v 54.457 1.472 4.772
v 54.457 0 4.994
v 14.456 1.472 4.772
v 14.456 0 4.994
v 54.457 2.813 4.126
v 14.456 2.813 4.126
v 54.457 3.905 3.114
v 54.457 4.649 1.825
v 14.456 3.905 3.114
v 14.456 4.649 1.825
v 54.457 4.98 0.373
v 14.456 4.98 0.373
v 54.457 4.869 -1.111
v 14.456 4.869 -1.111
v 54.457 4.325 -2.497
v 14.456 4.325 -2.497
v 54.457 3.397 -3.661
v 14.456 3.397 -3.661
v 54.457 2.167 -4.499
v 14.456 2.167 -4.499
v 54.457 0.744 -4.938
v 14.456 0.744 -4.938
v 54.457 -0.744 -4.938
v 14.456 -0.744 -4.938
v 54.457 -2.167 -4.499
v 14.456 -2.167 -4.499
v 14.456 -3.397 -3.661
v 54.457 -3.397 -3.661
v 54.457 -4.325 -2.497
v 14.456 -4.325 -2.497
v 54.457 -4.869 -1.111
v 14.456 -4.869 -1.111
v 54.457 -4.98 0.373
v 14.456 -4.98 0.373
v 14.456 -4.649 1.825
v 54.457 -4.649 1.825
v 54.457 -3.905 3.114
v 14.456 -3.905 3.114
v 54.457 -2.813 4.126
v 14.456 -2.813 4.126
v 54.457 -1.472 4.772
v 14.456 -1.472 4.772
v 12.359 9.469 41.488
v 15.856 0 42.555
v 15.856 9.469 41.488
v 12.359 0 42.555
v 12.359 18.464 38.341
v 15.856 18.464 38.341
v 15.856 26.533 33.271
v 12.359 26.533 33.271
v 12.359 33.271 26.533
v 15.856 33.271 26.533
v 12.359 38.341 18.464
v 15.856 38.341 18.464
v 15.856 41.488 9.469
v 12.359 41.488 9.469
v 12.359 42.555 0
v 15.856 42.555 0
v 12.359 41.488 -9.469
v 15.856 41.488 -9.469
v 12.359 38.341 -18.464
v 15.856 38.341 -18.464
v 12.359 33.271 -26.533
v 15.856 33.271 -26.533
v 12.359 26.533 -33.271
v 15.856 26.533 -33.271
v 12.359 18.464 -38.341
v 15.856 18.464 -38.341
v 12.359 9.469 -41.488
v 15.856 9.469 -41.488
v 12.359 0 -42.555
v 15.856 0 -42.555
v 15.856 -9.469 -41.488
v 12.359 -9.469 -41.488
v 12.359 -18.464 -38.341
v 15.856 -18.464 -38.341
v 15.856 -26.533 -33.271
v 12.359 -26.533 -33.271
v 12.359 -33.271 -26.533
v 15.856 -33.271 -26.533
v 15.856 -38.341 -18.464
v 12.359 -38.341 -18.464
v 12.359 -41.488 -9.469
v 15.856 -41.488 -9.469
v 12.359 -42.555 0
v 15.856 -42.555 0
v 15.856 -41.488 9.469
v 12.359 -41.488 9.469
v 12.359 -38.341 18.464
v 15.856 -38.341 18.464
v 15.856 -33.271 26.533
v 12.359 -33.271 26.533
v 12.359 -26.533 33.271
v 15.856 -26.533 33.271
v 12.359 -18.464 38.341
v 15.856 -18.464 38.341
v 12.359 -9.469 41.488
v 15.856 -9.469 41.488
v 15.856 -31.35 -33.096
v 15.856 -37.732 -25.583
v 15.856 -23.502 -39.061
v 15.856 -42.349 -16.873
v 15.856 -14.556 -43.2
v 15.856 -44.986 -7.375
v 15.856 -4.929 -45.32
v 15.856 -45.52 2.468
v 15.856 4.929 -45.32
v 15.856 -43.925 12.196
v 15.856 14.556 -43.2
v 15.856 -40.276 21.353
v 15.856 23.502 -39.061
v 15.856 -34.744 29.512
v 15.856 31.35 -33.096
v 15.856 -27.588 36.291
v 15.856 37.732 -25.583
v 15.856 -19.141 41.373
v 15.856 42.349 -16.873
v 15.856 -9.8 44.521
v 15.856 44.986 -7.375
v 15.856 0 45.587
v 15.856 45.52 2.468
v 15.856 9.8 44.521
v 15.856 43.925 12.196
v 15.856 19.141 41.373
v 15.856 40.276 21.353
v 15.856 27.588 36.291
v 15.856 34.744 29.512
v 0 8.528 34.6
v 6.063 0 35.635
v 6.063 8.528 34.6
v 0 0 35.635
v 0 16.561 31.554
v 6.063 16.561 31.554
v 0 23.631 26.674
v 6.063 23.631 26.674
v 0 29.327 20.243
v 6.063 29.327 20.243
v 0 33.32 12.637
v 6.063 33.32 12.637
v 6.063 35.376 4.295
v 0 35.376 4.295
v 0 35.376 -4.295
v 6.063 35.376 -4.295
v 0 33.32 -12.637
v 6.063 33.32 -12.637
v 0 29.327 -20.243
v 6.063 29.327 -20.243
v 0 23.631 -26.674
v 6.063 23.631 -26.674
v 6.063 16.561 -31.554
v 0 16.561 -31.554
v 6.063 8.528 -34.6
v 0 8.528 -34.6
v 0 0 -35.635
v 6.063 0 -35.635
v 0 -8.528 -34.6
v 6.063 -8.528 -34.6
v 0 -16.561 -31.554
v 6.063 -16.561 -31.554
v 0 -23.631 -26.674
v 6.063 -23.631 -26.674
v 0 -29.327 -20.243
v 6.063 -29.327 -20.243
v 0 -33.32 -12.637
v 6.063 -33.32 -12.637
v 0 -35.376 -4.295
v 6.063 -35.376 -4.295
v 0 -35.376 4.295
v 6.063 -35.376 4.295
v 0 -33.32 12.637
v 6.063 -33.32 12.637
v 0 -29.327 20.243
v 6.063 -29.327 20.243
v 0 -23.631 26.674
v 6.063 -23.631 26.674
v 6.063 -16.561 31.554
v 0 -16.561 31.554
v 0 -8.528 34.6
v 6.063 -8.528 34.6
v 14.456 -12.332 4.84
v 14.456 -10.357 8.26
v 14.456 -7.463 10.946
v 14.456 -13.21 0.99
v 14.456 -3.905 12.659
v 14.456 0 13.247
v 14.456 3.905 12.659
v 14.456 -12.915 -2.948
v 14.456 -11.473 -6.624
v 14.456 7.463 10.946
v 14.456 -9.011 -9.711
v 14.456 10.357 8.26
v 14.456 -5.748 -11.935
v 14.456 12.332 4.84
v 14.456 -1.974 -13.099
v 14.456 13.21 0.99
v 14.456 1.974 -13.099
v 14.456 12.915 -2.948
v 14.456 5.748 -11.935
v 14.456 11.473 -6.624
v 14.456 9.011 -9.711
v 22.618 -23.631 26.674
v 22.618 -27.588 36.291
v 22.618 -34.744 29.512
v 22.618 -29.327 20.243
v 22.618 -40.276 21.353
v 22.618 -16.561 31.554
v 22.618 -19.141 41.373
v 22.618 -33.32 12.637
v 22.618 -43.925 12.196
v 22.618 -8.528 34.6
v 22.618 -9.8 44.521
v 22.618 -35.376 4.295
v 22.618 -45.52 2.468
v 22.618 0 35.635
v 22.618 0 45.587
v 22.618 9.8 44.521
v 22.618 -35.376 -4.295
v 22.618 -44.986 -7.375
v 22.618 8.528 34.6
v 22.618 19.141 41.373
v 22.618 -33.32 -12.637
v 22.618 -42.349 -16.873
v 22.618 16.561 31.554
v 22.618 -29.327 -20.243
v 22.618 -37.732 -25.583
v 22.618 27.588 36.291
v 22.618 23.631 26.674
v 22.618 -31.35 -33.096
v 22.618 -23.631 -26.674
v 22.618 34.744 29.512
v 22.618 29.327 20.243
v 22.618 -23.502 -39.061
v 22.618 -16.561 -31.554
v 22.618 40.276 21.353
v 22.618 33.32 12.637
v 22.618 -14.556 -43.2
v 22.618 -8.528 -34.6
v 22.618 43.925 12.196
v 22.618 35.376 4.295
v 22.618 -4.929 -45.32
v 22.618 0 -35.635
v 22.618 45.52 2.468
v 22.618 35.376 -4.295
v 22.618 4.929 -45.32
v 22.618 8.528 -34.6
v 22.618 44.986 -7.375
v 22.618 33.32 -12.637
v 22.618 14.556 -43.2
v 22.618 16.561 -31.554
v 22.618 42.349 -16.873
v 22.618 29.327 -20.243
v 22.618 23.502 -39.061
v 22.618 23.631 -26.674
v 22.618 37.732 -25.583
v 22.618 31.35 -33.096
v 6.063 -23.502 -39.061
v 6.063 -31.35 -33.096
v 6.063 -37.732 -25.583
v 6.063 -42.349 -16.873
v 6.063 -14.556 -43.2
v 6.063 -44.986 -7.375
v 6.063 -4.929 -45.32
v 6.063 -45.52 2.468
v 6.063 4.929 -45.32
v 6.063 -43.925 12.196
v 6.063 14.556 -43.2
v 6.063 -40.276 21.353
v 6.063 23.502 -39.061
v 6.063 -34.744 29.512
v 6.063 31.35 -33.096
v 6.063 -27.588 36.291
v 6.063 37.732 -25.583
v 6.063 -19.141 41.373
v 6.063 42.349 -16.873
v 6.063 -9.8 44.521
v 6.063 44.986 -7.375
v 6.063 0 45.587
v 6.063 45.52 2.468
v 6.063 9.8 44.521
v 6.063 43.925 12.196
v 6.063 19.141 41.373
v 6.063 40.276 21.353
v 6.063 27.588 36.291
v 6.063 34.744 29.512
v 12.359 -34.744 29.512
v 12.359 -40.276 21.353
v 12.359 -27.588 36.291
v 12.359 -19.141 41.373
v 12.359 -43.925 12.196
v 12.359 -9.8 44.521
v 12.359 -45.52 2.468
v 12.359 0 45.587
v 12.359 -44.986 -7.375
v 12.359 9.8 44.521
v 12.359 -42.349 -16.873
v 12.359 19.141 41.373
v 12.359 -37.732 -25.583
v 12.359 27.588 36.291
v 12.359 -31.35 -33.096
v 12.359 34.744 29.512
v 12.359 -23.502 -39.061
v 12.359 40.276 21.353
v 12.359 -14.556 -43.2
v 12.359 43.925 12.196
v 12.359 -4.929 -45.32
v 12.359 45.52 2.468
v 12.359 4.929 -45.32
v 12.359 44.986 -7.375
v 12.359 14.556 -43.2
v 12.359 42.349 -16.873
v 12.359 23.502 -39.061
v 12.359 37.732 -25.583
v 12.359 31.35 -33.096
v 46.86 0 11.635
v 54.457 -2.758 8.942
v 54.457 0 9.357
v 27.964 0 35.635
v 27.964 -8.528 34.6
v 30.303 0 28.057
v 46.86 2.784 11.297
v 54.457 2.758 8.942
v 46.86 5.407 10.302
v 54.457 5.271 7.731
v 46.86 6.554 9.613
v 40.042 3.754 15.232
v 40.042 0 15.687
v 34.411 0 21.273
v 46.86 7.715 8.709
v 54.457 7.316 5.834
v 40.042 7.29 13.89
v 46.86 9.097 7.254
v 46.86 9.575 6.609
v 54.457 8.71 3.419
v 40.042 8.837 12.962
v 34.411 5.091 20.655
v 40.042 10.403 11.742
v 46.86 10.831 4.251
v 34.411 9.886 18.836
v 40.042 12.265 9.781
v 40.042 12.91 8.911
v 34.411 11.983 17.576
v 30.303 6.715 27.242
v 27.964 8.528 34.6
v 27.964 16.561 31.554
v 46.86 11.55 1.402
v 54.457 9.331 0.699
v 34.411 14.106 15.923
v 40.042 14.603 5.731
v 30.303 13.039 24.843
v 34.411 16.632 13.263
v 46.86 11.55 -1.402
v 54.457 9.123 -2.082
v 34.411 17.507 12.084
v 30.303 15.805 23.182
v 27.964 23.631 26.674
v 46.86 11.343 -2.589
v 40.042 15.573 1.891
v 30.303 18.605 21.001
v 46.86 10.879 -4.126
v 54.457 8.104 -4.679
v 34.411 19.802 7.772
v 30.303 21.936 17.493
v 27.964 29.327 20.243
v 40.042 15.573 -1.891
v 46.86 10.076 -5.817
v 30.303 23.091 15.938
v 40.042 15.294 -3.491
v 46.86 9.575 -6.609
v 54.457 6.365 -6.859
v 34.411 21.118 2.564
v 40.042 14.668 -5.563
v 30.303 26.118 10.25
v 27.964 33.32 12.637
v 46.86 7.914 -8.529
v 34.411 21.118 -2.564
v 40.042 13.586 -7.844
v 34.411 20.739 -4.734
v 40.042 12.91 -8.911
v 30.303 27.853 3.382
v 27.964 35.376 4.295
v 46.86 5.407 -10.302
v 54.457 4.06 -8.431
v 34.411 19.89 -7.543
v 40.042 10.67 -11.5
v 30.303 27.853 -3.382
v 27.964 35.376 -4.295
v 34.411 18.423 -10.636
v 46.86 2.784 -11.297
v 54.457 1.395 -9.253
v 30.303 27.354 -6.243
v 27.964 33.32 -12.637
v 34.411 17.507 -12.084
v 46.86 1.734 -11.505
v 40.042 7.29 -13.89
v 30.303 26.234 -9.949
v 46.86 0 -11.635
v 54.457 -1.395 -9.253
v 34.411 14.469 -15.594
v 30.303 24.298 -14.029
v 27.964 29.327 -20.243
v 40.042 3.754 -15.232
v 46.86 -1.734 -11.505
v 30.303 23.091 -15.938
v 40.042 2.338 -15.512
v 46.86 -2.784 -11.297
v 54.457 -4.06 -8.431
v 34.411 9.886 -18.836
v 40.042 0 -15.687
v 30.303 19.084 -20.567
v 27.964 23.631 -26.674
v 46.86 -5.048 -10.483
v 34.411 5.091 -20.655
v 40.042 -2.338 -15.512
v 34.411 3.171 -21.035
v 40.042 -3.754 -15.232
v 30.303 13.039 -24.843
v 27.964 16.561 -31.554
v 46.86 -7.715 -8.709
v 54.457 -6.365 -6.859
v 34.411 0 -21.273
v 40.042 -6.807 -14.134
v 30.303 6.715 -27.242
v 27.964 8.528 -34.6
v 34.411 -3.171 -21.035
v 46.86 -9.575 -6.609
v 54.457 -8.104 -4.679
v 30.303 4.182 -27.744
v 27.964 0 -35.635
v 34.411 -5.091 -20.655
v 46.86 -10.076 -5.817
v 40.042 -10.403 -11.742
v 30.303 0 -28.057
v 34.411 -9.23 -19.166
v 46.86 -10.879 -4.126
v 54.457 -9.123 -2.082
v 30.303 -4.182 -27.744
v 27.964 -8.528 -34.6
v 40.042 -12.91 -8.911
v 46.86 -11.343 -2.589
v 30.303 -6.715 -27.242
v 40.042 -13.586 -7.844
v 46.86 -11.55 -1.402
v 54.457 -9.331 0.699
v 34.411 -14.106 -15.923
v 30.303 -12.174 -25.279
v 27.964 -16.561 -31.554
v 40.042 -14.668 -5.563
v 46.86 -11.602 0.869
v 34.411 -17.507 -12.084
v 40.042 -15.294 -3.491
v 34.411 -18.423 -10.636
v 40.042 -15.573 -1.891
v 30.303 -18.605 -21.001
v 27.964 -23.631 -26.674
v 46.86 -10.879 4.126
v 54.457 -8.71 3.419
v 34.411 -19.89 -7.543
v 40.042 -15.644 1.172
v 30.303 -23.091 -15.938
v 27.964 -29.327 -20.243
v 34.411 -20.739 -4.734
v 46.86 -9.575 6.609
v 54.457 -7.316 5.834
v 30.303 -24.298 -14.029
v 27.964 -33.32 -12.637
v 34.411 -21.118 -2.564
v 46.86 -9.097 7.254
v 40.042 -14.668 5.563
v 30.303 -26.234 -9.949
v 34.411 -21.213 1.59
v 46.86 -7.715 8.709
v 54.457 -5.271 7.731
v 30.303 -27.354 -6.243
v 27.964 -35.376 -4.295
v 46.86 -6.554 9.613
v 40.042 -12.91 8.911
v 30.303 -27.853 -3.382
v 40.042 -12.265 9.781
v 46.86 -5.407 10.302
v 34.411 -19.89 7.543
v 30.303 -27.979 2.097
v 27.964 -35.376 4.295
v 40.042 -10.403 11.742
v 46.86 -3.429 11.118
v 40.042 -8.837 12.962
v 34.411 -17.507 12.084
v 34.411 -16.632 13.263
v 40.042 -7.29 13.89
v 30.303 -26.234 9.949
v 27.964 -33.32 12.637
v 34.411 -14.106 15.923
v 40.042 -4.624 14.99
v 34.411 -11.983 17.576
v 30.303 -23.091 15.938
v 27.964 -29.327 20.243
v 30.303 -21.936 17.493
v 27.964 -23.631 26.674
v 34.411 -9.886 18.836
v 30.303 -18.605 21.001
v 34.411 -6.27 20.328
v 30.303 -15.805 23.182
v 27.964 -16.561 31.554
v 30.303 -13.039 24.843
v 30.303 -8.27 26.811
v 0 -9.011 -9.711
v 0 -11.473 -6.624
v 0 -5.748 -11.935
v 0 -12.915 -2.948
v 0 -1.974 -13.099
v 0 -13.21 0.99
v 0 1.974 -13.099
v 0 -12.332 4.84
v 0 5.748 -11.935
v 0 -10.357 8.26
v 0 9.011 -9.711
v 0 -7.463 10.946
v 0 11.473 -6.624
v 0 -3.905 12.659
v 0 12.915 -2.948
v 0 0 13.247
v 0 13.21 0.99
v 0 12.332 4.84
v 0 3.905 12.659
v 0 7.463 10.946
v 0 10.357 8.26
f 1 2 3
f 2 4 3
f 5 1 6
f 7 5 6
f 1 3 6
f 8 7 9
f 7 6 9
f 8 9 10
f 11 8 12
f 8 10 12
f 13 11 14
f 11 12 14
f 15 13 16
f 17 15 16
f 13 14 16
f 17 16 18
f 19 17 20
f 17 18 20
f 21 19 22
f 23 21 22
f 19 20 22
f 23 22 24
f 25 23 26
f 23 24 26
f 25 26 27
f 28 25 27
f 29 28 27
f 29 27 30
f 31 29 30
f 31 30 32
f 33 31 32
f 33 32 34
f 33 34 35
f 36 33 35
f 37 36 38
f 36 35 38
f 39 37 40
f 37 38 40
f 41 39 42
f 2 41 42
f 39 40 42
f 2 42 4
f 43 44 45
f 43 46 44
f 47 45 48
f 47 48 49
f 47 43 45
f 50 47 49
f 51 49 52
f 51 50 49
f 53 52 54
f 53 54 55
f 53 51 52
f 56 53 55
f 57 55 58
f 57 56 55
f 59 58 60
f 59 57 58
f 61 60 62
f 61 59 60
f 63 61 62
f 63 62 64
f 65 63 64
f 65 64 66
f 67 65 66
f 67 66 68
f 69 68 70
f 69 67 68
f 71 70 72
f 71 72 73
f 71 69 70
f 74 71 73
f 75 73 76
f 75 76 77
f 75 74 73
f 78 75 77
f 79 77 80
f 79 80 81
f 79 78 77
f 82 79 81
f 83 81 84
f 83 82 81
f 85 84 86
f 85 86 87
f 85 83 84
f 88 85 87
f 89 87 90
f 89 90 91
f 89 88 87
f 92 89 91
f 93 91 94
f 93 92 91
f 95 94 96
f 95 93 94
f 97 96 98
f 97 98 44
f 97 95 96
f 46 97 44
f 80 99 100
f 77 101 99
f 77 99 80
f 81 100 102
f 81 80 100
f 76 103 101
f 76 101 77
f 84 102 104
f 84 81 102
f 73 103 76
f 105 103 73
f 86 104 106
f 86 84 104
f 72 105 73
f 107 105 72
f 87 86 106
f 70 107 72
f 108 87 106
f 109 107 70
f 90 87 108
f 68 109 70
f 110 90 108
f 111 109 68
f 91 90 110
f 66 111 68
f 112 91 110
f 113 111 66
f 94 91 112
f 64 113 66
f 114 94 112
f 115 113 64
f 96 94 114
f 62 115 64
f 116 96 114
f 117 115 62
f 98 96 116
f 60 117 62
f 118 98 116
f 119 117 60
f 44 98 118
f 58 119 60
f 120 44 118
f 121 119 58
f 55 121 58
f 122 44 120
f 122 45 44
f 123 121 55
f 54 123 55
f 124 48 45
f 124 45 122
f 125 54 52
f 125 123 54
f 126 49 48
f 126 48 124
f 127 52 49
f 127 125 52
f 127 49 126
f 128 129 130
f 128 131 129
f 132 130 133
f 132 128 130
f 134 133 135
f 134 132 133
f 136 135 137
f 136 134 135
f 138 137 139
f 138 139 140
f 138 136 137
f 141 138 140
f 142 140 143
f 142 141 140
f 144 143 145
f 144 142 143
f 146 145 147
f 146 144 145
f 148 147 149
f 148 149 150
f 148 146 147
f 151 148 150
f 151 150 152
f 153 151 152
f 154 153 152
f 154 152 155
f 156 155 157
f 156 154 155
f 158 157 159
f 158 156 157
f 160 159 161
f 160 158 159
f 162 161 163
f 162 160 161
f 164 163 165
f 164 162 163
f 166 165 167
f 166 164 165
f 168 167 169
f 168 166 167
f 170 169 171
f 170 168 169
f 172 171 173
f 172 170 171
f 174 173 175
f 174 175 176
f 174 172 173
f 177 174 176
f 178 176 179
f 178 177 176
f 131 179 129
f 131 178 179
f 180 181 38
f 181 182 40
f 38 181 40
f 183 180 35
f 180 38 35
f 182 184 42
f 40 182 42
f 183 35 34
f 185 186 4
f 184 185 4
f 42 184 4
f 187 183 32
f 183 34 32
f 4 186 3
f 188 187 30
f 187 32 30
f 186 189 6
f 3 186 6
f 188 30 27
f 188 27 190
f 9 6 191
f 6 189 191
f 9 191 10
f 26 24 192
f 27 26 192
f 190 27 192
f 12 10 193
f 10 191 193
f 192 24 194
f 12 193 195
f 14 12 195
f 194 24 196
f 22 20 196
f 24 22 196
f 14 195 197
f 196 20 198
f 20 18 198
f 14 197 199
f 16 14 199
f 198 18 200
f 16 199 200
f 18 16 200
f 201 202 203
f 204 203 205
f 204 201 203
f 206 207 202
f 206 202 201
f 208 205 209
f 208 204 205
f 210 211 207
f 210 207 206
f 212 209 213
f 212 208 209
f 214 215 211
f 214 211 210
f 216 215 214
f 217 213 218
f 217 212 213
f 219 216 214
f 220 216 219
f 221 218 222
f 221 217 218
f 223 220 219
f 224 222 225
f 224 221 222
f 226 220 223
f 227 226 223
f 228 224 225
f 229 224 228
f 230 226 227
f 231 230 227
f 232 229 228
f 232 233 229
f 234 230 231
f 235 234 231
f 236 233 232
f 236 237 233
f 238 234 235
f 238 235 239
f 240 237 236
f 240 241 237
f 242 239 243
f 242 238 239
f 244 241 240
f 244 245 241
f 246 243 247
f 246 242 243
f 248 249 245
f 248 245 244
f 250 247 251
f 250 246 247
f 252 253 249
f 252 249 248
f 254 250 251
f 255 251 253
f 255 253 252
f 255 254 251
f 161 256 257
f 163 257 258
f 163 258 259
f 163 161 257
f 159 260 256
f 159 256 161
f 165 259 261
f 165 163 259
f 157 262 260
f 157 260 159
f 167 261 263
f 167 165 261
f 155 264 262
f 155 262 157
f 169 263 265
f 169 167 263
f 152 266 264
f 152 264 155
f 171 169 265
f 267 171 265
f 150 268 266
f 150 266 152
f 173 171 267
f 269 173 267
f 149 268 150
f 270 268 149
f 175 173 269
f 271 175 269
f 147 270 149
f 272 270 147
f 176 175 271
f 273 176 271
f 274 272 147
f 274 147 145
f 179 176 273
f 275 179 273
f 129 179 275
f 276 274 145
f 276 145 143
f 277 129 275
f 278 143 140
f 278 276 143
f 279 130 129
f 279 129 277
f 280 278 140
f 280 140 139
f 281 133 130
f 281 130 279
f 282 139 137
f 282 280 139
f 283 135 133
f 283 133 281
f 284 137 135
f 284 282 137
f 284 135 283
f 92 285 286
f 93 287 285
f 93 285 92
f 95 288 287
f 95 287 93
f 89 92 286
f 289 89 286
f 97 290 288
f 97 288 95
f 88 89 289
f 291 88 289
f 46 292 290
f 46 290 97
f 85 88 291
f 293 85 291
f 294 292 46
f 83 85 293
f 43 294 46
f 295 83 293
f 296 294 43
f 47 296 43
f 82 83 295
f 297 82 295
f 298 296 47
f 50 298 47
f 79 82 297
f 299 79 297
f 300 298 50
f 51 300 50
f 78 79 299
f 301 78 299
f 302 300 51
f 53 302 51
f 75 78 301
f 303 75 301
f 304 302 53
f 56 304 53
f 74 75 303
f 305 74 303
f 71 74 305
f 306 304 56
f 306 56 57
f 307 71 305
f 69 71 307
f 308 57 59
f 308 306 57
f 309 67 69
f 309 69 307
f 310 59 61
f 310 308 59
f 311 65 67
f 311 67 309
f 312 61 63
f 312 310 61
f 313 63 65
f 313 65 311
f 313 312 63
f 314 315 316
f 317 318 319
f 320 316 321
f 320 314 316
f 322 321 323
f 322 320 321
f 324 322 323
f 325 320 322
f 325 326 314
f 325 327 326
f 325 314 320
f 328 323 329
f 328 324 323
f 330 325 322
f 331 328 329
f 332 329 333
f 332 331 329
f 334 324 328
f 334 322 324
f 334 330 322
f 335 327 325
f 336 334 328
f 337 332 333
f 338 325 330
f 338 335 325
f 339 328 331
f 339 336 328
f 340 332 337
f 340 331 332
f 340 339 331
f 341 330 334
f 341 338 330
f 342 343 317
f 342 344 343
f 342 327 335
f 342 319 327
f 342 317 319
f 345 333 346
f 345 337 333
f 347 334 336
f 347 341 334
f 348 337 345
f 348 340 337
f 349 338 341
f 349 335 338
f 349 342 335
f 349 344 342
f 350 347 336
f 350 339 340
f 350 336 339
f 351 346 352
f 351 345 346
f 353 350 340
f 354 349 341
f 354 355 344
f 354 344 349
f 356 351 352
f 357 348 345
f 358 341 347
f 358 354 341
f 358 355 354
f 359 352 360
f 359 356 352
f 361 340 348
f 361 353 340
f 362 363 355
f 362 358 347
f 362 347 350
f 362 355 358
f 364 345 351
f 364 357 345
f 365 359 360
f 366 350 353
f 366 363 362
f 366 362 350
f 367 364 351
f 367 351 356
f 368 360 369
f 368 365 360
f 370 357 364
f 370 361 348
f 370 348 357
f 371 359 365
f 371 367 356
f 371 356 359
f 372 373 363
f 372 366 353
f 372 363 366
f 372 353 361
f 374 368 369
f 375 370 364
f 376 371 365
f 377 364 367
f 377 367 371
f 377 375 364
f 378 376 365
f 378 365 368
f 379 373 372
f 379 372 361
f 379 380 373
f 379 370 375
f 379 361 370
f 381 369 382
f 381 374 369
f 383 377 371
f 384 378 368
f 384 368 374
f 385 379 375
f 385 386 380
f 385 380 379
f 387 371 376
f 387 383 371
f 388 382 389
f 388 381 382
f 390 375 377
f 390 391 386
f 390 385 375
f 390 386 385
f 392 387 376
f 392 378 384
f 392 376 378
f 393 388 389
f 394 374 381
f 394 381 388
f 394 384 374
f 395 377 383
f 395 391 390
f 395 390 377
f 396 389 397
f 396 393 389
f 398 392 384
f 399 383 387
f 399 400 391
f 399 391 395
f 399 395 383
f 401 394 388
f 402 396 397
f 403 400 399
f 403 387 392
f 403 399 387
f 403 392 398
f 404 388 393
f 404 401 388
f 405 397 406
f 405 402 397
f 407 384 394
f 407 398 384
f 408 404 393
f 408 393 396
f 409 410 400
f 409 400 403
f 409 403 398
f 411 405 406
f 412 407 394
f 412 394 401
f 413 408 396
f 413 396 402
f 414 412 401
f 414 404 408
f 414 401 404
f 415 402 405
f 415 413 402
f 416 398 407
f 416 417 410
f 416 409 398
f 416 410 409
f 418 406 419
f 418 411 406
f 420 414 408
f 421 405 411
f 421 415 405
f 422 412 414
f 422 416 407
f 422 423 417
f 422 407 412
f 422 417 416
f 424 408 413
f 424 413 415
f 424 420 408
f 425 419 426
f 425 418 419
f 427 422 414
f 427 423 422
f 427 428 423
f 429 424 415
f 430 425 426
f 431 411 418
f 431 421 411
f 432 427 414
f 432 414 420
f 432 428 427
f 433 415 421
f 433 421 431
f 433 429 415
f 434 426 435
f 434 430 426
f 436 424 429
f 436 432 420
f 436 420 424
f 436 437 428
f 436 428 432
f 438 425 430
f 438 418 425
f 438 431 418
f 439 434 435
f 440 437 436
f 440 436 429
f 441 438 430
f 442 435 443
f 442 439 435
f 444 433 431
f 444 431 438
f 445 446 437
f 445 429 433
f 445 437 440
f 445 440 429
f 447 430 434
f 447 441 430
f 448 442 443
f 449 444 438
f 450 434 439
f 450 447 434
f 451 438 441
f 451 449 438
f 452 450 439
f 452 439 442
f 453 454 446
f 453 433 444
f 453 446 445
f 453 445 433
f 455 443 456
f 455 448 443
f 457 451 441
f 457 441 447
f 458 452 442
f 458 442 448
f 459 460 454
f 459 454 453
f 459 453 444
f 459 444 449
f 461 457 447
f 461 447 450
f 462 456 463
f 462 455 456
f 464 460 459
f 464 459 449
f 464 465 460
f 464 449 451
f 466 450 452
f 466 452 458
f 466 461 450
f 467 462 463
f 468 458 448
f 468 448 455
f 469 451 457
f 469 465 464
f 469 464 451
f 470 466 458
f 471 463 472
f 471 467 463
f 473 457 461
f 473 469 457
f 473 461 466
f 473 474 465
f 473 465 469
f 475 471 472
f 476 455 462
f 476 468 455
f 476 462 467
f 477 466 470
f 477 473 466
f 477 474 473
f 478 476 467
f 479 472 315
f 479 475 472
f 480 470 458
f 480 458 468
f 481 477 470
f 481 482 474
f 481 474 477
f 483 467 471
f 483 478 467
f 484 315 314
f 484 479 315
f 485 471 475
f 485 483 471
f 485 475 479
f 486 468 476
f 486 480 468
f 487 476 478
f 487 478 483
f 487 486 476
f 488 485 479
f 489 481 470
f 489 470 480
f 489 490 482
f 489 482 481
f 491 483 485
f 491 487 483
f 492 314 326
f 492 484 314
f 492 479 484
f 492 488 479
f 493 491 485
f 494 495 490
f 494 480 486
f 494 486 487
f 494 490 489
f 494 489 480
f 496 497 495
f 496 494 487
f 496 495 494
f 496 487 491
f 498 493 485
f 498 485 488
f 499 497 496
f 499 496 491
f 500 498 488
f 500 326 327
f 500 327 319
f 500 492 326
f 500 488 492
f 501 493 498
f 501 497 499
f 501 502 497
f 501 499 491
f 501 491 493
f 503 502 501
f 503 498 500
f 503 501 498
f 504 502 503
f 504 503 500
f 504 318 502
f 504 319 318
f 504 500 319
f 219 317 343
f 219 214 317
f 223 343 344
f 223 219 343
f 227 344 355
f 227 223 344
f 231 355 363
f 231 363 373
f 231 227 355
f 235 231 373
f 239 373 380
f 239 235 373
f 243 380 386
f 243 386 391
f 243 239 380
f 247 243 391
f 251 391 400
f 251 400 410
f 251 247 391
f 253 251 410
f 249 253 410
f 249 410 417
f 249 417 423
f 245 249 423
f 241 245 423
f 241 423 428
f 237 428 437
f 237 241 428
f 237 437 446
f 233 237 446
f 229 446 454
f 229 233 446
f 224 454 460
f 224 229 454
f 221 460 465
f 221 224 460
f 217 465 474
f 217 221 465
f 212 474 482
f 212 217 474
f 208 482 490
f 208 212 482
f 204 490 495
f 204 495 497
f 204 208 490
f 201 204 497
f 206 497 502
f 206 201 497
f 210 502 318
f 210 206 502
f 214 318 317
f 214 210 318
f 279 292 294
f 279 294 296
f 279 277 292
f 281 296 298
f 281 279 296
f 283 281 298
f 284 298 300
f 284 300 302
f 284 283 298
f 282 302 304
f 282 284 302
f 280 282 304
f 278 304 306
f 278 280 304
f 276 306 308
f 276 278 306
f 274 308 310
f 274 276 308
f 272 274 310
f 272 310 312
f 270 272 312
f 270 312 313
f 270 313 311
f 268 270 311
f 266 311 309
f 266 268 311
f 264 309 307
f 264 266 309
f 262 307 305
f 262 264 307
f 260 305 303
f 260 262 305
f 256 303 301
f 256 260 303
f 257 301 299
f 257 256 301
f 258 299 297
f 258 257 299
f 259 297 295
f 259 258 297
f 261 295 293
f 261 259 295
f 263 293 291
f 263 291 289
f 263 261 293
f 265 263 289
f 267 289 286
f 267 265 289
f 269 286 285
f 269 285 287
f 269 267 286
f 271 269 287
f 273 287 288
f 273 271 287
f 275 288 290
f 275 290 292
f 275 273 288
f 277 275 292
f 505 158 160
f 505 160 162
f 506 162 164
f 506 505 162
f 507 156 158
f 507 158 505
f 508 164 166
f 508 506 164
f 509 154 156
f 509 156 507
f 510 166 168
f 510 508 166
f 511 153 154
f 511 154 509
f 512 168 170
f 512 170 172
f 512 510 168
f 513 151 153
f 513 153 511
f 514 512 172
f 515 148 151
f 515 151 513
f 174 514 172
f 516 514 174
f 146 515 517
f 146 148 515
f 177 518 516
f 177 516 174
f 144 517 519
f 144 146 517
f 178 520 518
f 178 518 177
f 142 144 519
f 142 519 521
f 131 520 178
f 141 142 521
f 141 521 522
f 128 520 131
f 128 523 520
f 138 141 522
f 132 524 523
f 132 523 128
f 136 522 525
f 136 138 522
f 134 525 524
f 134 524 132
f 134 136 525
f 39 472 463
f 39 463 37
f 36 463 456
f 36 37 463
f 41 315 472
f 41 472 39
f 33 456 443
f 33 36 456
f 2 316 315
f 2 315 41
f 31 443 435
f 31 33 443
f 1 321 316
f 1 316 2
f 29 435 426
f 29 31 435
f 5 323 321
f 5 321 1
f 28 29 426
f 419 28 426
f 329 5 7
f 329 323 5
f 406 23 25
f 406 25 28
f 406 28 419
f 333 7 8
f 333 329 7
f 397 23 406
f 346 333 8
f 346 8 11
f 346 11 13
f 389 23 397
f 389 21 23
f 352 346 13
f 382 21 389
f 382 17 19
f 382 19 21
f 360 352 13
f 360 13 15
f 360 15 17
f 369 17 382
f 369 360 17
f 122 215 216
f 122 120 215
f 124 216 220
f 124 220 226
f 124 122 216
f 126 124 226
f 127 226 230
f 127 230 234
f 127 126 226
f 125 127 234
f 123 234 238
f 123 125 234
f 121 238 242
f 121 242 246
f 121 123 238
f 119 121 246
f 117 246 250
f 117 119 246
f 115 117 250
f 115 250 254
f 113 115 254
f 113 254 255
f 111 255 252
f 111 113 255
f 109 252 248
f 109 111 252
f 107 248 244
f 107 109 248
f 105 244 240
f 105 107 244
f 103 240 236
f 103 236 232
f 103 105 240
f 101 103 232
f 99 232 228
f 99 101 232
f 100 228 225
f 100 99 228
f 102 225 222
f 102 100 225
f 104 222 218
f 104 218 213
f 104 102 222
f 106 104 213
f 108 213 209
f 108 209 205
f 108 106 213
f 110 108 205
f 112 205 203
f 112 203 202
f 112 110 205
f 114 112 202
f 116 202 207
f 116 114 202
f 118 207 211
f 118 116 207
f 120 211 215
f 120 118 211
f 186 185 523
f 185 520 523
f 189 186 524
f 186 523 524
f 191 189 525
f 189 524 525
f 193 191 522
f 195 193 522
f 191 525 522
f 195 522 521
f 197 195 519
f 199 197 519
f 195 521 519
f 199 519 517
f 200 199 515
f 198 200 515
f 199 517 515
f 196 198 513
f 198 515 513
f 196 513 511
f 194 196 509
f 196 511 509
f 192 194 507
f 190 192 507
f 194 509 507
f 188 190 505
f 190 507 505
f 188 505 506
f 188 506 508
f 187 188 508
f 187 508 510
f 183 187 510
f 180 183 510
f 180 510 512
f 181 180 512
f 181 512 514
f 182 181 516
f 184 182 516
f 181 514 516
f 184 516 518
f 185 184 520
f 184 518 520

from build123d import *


with BuildPart() as f1:
    # F0 (on Front) → F1 (revolve)
    with BuildSketch(Plane.XZ):
        with BuildLine():
            Line((0, 35.635482), (0, 0))
            Line((0, 0), (54.456629, 0))
            Line((54.456629, 0), (54.456629, 9.35728))
            ThreePointArc((54.456629, 9.35728), (37.055172, 18.307365), (27.963908, 35.635482))
            Line((27.963908, 35.635482), (22.618492, 35.635482))
            Line((22.618492, 35.635482), (22.618492, 45.586757))
            Line((22.618492, 45.586757), (15.856263, 45.586757))
            Line((15.856263, 45.586757), (15.856263, 42.555407))
            Line((15.856263, 42.555407), (12.358558, 42.555407))
            Line((12.358558, 42.555407), (12.358558, 45.586757))
            Line((12.358558, 45.586757), (6.062689, 45.586757))
            Line((6.062689, 45.586757), (6.062689, 35.635482))
            Line((6.062689, 35.635482), (0, 35.635482))
        make_face()
    revolve(axis=Axis((27.228314, 0, 0), (-1, 0, 0)))

    # F2 (on Front) → F3 (revolve, cut)
    with BuildSketch(Plane.XZ):
        Polygon((0, 13.247386), (0, 0), (56.932209, 0), (56.932209, 4.994054), (14.45647, 4.994054), (14.45647, 13.247386), align=None)
    revolve(axis=Axis((28.466105, 0, 0), (-1, 0, 0)), mode=Mode.SUBTRACT)


solid = f1.part
